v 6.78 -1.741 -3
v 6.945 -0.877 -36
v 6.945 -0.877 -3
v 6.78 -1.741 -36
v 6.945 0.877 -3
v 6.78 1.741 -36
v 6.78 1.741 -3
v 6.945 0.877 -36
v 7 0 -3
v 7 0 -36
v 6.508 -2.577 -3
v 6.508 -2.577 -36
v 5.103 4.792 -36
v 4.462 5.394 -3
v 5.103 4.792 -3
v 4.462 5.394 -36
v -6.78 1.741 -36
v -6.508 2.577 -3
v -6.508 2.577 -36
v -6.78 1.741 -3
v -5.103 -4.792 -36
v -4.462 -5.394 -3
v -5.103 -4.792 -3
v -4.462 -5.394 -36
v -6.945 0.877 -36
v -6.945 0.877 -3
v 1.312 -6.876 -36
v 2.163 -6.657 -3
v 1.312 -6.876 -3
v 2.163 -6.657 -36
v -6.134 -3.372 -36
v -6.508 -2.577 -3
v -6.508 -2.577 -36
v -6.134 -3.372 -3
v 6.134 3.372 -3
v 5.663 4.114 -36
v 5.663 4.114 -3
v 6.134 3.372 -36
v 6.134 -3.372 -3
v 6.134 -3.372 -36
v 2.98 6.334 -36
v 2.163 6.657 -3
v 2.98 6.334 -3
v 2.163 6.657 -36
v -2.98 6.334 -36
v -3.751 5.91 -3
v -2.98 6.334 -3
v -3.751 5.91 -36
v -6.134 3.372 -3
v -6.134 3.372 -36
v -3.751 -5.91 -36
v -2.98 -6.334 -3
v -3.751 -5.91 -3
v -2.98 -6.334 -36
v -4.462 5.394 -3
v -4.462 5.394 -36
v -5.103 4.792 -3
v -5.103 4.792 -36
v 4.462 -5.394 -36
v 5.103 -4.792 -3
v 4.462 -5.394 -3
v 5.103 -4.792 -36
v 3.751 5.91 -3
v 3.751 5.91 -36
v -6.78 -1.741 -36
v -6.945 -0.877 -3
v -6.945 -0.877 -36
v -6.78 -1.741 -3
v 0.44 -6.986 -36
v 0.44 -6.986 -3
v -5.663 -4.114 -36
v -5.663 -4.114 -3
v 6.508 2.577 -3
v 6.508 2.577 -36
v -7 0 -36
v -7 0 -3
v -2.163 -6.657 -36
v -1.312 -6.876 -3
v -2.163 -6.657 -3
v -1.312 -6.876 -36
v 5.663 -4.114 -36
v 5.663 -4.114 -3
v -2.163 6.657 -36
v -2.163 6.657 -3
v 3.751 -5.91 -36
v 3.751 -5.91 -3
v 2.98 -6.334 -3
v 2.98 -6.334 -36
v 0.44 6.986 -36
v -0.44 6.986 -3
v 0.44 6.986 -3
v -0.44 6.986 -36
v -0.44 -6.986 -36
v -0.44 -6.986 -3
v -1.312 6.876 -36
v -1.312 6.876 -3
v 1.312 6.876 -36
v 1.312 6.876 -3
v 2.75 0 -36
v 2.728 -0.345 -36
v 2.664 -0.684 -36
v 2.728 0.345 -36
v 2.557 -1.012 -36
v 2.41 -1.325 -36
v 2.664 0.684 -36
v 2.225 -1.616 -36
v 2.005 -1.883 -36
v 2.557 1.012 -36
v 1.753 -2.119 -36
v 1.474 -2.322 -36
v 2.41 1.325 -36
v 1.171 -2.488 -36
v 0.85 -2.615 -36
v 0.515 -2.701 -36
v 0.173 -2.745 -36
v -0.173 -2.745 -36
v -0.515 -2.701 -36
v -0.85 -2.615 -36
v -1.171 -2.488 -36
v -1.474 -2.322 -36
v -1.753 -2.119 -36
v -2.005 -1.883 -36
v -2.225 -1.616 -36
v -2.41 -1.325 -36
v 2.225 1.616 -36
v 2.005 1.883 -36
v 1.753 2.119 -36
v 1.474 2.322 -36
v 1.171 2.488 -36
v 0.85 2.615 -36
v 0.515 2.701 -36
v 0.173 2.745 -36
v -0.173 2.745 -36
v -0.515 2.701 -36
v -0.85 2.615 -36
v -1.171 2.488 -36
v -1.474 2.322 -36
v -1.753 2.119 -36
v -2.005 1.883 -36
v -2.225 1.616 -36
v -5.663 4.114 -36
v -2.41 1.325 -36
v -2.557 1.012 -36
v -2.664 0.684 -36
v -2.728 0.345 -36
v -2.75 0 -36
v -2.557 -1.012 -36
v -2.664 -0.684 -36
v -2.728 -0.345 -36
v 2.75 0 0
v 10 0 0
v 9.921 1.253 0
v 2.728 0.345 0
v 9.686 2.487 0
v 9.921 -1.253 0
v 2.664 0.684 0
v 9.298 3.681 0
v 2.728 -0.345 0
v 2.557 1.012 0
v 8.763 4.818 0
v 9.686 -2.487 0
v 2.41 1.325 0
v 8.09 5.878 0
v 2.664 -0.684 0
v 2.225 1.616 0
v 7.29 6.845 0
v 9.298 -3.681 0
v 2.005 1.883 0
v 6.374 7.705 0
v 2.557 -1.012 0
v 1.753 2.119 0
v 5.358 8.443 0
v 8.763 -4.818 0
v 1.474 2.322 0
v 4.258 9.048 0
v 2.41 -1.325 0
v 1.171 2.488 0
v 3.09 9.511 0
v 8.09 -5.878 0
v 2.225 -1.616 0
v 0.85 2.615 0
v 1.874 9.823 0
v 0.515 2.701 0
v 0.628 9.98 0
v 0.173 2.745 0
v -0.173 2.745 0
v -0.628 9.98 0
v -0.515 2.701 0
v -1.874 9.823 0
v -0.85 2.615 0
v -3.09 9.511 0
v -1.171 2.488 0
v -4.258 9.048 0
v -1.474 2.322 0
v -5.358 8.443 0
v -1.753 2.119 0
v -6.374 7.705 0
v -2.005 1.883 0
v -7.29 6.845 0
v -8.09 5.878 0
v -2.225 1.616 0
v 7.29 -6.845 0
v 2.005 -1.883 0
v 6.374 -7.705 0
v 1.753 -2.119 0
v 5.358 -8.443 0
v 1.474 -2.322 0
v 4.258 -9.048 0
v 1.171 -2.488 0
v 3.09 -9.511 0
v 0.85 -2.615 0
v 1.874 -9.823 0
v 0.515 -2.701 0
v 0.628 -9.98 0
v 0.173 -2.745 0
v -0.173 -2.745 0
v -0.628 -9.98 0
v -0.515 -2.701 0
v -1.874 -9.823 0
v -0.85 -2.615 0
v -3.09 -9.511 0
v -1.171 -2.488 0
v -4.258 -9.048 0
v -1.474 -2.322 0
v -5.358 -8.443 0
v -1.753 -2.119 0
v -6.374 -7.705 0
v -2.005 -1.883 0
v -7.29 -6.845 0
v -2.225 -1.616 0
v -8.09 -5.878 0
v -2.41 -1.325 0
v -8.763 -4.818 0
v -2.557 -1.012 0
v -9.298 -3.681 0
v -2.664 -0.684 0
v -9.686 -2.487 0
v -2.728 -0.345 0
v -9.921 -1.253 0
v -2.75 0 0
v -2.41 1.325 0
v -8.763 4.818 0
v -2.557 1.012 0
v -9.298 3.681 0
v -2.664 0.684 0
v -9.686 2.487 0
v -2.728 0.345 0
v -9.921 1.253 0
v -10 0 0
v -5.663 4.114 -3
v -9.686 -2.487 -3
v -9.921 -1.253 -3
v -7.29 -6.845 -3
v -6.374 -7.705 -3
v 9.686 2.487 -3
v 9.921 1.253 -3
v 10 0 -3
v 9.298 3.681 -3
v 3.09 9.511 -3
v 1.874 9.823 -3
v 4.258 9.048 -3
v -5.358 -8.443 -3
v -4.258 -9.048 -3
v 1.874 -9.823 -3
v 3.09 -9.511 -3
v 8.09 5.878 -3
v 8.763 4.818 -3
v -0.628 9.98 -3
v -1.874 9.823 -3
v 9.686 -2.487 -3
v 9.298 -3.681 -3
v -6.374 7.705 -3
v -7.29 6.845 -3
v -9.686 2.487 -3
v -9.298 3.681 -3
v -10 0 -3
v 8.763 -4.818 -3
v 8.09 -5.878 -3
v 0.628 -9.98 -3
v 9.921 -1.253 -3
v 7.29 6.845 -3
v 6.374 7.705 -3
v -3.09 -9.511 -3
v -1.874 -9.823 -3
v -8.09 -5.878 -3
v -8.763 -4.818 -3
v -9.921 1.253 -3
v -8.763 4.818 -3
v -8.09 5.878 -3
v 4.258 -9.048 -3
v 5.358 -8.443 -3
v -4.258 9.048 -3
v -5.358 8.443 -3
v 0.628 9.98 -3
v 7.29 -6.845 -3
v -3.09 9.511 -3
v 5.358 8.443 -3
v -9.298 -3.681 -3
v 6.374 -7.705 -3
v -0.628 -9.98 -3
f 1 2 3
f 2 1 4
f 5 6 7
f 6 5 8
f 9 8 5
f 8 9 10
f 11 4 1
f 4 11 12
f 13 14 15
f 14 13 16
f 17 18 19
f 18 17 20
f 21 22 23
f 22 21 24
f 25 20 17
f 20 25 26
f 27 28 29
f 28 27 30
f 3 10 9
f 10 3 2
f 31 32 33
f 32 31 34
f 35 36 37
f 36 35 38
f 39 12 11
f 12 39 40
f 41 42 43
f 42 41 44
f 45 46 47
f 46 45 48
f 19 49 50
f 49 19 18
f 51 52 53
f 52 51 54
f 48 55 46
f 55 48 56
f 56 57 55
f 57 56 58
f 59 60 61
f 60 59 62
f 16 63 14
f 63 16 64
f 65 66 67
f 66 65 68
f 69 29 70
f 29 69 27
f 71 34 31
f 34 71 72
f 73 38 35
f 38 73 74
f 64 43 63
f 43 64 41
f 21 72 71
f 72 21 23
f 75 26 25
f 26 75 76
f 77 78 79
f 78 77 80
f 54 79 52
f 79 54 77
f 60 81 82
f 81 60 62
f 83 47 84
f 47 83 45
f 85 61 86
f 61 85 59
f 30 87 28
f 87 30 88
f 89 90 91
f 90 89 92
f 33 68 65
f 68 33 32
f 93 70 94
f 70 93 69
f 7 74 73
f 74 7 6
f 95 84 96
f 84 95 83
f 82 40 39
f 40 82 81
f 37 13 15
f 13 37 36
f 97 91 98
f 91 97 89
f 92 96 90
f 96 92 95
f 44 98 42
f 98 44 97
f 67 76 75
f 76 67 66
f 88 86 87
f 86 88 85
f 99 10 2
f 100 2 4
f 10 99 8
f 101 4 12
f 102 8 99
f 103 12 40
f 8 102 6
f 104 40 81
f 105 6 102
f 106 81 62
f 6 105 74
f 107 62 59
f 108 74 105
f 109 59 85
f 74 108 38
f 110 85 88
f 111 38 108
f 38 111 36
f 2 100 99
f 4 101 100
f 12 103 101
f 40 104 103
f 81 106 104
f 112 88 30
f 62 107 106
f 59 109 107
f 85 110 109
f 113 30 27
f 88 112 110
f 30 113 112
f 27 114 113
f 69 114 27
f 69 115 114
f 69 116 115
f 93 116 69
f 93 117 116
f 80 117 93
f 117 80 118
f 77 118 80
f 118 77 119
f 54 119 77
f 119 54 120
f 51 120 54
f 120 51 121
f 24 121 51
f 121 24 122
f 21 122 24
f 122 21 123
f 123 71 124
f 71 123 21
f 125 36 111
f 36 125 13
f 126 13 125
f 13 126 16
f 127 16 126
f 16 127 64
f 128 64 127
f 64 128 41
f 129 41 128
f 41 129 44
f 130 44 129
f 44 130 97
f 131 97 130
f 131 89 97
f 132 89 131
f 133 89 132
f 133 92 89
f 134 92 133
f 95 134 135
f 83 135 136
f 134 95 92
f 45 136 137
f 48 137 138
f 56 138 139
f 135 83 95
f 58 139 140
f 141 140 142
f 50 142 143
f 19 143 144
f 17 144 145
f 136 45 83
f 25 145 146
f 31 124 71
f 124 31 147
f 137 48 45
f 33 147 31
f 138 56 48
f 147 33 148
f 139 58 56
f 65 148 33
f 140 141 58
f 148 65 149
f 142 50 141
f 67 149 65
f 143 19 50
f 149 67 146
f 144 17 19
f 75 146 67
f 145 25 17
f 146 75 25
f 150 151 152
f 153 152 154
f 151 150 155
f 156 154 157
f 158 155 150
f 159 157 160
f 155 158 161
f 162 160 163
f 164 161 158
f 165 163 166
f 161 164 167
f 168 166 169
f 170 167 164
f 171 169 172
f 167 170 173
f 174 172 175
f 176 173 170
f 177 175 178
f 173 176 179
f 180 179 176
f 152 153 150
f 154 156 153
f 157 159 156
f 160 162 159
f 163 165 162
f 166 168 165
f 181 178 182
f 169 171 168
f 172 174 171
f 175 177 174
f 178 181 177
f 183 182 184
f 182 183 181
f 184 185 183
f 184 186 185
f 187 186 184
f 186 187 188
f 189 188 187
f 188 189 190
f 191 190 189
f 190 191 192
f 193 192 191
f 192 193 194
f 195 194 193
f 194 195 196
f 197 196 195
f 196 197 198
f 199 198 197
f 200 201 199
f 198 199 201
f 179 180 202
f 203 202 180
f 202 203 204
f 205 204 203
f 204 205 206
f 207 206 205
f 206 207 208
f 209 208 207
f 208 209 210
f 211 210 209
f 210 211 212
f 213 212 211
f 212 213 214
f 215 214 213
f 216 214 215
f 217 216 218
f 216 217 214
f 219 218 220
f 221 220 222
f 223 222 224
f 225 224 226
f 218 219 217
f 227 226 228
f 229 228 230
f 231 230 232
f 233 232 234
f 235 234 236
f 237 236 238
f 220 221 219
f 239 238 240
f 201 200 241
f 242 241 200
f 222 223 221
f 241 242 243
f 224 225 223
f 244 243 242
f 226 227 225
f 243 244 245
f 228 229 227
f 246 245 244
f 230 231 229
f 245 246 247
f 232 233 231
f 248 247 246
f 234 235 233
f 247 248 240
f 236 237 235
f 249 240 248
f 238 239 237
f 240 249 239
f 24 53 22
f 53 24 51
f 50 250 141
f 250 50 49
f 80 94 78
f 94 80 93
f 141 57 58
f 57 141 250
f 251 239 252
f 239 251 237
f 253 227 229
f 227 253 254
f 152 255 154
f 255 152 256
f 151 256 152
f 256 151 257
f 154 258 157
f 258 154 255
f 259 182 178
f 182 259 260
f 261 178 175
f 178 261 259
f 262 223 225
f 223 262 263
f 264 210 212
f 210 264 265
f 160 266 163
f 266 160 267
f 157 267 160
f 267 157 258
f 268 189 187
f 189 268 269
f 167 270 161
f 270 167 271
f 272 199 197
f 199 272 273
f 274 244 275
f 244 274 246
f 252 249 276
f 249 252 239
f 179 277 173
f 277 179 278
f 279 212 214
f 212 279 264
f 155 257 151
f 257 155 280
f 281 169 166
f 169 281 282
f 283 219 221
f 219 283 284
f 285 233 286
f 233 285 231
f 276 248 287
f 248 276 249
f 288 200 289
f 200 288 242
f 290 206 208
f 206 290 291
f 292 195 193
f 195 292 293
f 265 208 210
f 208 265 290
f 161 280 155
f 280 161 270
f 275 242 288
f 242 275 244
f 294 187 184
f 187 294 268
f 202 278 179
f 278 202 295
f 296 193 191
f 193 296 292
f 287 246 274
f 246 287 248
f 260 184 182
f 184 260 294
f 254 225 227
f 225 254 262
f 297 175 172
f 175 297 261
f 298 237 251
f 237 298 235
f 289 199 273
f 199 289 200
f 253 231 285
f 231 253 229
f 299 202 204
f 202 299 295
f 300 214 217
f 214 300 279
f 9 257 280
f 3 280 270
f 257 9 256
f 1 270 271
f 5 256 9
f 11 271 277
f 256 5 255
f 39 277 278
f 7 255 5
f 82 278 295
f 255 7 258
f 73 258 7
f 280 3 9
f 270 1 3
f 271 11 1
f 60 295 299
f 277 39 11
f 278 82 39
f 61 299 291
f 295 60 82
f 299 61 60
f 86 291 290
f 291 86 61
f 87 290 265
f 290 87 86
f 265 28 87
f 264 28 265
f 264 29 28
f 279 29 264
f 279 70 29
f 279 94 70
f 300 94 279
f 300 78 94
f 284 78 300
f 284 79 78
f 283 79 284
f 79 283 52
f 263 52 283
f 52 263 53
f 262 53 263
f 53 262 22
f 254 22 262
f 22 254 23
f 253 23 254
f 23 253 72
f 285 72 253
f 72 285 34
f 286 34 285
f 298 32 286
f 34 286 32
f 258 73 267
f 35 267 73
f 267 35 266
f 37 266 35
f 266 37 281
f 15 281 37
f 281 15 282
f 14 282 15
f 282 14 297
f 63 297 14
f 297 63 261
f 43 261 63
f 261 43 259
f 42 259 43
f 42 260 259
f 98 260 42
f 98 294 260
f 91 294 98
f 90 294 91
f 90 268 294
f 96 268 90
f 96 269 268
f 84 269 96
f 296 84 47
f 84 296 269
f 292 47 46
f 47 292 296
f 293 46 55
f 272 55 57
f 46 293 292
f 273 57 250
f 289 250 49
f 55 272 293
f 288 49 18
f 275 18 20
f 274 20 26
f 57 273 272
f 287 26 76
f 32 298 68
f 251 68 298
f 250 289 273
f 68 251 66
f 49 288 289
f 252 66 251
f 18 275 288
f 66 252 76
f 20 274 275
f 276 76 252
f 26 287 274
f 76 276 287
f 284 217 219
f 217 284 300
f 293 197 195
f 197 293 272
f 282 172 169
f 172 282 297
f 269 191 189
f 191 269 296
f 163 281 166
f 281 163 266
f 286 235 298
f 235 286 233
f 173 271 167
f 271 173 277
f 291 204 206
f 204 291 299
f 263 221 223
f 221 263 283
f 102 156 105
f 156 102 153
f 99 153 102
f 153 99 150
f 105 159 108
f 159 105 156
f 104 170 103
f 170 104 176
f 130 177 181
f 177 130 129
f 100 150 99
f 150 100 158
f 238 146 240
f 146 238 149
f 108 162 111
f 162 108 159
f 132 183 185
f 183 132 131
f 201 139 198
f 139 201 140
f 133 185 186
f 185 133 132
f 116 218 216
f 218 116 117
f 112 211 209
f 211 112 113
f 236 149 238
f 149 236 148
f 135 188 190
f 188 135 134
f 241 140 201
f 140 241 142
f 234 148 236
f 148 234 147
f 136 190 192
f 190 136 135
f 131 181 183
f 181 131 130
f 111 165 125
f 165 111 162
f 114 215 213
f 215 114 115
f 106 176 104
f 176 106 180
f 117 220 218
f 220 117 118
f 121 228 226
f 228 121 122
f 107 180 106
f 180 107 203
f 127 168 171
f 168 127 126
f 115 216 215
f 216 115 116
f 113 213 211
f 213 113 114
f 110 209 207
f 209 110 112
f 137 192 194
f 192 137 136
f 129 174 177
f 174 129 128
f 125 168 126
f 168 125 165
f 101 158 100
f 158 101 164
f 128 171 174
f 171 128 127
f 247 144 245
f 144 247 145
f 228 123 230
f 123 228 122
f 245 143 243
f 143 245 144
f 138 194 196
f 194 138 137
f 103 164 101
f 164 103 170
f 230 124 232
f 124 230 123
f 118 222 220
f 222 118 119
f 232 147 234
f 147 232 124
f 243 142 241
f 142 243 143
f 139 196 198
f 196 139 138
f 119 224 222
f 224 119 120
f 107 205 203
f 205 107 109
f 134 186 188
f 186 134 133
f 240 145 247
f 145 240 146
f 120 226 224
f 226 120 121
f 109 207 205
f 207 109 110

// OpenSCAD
$fn = 50;


difference() {
	union() {
		translate(v = [0, 0, -36.0000000000]) {
			cylinder(h = 36, r = 7.0000000000);
		}
		translate(v = [0, 0, -3.0000000000]) {
			cylinder(h = 3, r = 10.0000000000);
		}
	}
	union() {
		#translate(v = [0, 0, -36]) {
			cylinder(h = 36, r = 2.7500000000);
		}
	}
}
